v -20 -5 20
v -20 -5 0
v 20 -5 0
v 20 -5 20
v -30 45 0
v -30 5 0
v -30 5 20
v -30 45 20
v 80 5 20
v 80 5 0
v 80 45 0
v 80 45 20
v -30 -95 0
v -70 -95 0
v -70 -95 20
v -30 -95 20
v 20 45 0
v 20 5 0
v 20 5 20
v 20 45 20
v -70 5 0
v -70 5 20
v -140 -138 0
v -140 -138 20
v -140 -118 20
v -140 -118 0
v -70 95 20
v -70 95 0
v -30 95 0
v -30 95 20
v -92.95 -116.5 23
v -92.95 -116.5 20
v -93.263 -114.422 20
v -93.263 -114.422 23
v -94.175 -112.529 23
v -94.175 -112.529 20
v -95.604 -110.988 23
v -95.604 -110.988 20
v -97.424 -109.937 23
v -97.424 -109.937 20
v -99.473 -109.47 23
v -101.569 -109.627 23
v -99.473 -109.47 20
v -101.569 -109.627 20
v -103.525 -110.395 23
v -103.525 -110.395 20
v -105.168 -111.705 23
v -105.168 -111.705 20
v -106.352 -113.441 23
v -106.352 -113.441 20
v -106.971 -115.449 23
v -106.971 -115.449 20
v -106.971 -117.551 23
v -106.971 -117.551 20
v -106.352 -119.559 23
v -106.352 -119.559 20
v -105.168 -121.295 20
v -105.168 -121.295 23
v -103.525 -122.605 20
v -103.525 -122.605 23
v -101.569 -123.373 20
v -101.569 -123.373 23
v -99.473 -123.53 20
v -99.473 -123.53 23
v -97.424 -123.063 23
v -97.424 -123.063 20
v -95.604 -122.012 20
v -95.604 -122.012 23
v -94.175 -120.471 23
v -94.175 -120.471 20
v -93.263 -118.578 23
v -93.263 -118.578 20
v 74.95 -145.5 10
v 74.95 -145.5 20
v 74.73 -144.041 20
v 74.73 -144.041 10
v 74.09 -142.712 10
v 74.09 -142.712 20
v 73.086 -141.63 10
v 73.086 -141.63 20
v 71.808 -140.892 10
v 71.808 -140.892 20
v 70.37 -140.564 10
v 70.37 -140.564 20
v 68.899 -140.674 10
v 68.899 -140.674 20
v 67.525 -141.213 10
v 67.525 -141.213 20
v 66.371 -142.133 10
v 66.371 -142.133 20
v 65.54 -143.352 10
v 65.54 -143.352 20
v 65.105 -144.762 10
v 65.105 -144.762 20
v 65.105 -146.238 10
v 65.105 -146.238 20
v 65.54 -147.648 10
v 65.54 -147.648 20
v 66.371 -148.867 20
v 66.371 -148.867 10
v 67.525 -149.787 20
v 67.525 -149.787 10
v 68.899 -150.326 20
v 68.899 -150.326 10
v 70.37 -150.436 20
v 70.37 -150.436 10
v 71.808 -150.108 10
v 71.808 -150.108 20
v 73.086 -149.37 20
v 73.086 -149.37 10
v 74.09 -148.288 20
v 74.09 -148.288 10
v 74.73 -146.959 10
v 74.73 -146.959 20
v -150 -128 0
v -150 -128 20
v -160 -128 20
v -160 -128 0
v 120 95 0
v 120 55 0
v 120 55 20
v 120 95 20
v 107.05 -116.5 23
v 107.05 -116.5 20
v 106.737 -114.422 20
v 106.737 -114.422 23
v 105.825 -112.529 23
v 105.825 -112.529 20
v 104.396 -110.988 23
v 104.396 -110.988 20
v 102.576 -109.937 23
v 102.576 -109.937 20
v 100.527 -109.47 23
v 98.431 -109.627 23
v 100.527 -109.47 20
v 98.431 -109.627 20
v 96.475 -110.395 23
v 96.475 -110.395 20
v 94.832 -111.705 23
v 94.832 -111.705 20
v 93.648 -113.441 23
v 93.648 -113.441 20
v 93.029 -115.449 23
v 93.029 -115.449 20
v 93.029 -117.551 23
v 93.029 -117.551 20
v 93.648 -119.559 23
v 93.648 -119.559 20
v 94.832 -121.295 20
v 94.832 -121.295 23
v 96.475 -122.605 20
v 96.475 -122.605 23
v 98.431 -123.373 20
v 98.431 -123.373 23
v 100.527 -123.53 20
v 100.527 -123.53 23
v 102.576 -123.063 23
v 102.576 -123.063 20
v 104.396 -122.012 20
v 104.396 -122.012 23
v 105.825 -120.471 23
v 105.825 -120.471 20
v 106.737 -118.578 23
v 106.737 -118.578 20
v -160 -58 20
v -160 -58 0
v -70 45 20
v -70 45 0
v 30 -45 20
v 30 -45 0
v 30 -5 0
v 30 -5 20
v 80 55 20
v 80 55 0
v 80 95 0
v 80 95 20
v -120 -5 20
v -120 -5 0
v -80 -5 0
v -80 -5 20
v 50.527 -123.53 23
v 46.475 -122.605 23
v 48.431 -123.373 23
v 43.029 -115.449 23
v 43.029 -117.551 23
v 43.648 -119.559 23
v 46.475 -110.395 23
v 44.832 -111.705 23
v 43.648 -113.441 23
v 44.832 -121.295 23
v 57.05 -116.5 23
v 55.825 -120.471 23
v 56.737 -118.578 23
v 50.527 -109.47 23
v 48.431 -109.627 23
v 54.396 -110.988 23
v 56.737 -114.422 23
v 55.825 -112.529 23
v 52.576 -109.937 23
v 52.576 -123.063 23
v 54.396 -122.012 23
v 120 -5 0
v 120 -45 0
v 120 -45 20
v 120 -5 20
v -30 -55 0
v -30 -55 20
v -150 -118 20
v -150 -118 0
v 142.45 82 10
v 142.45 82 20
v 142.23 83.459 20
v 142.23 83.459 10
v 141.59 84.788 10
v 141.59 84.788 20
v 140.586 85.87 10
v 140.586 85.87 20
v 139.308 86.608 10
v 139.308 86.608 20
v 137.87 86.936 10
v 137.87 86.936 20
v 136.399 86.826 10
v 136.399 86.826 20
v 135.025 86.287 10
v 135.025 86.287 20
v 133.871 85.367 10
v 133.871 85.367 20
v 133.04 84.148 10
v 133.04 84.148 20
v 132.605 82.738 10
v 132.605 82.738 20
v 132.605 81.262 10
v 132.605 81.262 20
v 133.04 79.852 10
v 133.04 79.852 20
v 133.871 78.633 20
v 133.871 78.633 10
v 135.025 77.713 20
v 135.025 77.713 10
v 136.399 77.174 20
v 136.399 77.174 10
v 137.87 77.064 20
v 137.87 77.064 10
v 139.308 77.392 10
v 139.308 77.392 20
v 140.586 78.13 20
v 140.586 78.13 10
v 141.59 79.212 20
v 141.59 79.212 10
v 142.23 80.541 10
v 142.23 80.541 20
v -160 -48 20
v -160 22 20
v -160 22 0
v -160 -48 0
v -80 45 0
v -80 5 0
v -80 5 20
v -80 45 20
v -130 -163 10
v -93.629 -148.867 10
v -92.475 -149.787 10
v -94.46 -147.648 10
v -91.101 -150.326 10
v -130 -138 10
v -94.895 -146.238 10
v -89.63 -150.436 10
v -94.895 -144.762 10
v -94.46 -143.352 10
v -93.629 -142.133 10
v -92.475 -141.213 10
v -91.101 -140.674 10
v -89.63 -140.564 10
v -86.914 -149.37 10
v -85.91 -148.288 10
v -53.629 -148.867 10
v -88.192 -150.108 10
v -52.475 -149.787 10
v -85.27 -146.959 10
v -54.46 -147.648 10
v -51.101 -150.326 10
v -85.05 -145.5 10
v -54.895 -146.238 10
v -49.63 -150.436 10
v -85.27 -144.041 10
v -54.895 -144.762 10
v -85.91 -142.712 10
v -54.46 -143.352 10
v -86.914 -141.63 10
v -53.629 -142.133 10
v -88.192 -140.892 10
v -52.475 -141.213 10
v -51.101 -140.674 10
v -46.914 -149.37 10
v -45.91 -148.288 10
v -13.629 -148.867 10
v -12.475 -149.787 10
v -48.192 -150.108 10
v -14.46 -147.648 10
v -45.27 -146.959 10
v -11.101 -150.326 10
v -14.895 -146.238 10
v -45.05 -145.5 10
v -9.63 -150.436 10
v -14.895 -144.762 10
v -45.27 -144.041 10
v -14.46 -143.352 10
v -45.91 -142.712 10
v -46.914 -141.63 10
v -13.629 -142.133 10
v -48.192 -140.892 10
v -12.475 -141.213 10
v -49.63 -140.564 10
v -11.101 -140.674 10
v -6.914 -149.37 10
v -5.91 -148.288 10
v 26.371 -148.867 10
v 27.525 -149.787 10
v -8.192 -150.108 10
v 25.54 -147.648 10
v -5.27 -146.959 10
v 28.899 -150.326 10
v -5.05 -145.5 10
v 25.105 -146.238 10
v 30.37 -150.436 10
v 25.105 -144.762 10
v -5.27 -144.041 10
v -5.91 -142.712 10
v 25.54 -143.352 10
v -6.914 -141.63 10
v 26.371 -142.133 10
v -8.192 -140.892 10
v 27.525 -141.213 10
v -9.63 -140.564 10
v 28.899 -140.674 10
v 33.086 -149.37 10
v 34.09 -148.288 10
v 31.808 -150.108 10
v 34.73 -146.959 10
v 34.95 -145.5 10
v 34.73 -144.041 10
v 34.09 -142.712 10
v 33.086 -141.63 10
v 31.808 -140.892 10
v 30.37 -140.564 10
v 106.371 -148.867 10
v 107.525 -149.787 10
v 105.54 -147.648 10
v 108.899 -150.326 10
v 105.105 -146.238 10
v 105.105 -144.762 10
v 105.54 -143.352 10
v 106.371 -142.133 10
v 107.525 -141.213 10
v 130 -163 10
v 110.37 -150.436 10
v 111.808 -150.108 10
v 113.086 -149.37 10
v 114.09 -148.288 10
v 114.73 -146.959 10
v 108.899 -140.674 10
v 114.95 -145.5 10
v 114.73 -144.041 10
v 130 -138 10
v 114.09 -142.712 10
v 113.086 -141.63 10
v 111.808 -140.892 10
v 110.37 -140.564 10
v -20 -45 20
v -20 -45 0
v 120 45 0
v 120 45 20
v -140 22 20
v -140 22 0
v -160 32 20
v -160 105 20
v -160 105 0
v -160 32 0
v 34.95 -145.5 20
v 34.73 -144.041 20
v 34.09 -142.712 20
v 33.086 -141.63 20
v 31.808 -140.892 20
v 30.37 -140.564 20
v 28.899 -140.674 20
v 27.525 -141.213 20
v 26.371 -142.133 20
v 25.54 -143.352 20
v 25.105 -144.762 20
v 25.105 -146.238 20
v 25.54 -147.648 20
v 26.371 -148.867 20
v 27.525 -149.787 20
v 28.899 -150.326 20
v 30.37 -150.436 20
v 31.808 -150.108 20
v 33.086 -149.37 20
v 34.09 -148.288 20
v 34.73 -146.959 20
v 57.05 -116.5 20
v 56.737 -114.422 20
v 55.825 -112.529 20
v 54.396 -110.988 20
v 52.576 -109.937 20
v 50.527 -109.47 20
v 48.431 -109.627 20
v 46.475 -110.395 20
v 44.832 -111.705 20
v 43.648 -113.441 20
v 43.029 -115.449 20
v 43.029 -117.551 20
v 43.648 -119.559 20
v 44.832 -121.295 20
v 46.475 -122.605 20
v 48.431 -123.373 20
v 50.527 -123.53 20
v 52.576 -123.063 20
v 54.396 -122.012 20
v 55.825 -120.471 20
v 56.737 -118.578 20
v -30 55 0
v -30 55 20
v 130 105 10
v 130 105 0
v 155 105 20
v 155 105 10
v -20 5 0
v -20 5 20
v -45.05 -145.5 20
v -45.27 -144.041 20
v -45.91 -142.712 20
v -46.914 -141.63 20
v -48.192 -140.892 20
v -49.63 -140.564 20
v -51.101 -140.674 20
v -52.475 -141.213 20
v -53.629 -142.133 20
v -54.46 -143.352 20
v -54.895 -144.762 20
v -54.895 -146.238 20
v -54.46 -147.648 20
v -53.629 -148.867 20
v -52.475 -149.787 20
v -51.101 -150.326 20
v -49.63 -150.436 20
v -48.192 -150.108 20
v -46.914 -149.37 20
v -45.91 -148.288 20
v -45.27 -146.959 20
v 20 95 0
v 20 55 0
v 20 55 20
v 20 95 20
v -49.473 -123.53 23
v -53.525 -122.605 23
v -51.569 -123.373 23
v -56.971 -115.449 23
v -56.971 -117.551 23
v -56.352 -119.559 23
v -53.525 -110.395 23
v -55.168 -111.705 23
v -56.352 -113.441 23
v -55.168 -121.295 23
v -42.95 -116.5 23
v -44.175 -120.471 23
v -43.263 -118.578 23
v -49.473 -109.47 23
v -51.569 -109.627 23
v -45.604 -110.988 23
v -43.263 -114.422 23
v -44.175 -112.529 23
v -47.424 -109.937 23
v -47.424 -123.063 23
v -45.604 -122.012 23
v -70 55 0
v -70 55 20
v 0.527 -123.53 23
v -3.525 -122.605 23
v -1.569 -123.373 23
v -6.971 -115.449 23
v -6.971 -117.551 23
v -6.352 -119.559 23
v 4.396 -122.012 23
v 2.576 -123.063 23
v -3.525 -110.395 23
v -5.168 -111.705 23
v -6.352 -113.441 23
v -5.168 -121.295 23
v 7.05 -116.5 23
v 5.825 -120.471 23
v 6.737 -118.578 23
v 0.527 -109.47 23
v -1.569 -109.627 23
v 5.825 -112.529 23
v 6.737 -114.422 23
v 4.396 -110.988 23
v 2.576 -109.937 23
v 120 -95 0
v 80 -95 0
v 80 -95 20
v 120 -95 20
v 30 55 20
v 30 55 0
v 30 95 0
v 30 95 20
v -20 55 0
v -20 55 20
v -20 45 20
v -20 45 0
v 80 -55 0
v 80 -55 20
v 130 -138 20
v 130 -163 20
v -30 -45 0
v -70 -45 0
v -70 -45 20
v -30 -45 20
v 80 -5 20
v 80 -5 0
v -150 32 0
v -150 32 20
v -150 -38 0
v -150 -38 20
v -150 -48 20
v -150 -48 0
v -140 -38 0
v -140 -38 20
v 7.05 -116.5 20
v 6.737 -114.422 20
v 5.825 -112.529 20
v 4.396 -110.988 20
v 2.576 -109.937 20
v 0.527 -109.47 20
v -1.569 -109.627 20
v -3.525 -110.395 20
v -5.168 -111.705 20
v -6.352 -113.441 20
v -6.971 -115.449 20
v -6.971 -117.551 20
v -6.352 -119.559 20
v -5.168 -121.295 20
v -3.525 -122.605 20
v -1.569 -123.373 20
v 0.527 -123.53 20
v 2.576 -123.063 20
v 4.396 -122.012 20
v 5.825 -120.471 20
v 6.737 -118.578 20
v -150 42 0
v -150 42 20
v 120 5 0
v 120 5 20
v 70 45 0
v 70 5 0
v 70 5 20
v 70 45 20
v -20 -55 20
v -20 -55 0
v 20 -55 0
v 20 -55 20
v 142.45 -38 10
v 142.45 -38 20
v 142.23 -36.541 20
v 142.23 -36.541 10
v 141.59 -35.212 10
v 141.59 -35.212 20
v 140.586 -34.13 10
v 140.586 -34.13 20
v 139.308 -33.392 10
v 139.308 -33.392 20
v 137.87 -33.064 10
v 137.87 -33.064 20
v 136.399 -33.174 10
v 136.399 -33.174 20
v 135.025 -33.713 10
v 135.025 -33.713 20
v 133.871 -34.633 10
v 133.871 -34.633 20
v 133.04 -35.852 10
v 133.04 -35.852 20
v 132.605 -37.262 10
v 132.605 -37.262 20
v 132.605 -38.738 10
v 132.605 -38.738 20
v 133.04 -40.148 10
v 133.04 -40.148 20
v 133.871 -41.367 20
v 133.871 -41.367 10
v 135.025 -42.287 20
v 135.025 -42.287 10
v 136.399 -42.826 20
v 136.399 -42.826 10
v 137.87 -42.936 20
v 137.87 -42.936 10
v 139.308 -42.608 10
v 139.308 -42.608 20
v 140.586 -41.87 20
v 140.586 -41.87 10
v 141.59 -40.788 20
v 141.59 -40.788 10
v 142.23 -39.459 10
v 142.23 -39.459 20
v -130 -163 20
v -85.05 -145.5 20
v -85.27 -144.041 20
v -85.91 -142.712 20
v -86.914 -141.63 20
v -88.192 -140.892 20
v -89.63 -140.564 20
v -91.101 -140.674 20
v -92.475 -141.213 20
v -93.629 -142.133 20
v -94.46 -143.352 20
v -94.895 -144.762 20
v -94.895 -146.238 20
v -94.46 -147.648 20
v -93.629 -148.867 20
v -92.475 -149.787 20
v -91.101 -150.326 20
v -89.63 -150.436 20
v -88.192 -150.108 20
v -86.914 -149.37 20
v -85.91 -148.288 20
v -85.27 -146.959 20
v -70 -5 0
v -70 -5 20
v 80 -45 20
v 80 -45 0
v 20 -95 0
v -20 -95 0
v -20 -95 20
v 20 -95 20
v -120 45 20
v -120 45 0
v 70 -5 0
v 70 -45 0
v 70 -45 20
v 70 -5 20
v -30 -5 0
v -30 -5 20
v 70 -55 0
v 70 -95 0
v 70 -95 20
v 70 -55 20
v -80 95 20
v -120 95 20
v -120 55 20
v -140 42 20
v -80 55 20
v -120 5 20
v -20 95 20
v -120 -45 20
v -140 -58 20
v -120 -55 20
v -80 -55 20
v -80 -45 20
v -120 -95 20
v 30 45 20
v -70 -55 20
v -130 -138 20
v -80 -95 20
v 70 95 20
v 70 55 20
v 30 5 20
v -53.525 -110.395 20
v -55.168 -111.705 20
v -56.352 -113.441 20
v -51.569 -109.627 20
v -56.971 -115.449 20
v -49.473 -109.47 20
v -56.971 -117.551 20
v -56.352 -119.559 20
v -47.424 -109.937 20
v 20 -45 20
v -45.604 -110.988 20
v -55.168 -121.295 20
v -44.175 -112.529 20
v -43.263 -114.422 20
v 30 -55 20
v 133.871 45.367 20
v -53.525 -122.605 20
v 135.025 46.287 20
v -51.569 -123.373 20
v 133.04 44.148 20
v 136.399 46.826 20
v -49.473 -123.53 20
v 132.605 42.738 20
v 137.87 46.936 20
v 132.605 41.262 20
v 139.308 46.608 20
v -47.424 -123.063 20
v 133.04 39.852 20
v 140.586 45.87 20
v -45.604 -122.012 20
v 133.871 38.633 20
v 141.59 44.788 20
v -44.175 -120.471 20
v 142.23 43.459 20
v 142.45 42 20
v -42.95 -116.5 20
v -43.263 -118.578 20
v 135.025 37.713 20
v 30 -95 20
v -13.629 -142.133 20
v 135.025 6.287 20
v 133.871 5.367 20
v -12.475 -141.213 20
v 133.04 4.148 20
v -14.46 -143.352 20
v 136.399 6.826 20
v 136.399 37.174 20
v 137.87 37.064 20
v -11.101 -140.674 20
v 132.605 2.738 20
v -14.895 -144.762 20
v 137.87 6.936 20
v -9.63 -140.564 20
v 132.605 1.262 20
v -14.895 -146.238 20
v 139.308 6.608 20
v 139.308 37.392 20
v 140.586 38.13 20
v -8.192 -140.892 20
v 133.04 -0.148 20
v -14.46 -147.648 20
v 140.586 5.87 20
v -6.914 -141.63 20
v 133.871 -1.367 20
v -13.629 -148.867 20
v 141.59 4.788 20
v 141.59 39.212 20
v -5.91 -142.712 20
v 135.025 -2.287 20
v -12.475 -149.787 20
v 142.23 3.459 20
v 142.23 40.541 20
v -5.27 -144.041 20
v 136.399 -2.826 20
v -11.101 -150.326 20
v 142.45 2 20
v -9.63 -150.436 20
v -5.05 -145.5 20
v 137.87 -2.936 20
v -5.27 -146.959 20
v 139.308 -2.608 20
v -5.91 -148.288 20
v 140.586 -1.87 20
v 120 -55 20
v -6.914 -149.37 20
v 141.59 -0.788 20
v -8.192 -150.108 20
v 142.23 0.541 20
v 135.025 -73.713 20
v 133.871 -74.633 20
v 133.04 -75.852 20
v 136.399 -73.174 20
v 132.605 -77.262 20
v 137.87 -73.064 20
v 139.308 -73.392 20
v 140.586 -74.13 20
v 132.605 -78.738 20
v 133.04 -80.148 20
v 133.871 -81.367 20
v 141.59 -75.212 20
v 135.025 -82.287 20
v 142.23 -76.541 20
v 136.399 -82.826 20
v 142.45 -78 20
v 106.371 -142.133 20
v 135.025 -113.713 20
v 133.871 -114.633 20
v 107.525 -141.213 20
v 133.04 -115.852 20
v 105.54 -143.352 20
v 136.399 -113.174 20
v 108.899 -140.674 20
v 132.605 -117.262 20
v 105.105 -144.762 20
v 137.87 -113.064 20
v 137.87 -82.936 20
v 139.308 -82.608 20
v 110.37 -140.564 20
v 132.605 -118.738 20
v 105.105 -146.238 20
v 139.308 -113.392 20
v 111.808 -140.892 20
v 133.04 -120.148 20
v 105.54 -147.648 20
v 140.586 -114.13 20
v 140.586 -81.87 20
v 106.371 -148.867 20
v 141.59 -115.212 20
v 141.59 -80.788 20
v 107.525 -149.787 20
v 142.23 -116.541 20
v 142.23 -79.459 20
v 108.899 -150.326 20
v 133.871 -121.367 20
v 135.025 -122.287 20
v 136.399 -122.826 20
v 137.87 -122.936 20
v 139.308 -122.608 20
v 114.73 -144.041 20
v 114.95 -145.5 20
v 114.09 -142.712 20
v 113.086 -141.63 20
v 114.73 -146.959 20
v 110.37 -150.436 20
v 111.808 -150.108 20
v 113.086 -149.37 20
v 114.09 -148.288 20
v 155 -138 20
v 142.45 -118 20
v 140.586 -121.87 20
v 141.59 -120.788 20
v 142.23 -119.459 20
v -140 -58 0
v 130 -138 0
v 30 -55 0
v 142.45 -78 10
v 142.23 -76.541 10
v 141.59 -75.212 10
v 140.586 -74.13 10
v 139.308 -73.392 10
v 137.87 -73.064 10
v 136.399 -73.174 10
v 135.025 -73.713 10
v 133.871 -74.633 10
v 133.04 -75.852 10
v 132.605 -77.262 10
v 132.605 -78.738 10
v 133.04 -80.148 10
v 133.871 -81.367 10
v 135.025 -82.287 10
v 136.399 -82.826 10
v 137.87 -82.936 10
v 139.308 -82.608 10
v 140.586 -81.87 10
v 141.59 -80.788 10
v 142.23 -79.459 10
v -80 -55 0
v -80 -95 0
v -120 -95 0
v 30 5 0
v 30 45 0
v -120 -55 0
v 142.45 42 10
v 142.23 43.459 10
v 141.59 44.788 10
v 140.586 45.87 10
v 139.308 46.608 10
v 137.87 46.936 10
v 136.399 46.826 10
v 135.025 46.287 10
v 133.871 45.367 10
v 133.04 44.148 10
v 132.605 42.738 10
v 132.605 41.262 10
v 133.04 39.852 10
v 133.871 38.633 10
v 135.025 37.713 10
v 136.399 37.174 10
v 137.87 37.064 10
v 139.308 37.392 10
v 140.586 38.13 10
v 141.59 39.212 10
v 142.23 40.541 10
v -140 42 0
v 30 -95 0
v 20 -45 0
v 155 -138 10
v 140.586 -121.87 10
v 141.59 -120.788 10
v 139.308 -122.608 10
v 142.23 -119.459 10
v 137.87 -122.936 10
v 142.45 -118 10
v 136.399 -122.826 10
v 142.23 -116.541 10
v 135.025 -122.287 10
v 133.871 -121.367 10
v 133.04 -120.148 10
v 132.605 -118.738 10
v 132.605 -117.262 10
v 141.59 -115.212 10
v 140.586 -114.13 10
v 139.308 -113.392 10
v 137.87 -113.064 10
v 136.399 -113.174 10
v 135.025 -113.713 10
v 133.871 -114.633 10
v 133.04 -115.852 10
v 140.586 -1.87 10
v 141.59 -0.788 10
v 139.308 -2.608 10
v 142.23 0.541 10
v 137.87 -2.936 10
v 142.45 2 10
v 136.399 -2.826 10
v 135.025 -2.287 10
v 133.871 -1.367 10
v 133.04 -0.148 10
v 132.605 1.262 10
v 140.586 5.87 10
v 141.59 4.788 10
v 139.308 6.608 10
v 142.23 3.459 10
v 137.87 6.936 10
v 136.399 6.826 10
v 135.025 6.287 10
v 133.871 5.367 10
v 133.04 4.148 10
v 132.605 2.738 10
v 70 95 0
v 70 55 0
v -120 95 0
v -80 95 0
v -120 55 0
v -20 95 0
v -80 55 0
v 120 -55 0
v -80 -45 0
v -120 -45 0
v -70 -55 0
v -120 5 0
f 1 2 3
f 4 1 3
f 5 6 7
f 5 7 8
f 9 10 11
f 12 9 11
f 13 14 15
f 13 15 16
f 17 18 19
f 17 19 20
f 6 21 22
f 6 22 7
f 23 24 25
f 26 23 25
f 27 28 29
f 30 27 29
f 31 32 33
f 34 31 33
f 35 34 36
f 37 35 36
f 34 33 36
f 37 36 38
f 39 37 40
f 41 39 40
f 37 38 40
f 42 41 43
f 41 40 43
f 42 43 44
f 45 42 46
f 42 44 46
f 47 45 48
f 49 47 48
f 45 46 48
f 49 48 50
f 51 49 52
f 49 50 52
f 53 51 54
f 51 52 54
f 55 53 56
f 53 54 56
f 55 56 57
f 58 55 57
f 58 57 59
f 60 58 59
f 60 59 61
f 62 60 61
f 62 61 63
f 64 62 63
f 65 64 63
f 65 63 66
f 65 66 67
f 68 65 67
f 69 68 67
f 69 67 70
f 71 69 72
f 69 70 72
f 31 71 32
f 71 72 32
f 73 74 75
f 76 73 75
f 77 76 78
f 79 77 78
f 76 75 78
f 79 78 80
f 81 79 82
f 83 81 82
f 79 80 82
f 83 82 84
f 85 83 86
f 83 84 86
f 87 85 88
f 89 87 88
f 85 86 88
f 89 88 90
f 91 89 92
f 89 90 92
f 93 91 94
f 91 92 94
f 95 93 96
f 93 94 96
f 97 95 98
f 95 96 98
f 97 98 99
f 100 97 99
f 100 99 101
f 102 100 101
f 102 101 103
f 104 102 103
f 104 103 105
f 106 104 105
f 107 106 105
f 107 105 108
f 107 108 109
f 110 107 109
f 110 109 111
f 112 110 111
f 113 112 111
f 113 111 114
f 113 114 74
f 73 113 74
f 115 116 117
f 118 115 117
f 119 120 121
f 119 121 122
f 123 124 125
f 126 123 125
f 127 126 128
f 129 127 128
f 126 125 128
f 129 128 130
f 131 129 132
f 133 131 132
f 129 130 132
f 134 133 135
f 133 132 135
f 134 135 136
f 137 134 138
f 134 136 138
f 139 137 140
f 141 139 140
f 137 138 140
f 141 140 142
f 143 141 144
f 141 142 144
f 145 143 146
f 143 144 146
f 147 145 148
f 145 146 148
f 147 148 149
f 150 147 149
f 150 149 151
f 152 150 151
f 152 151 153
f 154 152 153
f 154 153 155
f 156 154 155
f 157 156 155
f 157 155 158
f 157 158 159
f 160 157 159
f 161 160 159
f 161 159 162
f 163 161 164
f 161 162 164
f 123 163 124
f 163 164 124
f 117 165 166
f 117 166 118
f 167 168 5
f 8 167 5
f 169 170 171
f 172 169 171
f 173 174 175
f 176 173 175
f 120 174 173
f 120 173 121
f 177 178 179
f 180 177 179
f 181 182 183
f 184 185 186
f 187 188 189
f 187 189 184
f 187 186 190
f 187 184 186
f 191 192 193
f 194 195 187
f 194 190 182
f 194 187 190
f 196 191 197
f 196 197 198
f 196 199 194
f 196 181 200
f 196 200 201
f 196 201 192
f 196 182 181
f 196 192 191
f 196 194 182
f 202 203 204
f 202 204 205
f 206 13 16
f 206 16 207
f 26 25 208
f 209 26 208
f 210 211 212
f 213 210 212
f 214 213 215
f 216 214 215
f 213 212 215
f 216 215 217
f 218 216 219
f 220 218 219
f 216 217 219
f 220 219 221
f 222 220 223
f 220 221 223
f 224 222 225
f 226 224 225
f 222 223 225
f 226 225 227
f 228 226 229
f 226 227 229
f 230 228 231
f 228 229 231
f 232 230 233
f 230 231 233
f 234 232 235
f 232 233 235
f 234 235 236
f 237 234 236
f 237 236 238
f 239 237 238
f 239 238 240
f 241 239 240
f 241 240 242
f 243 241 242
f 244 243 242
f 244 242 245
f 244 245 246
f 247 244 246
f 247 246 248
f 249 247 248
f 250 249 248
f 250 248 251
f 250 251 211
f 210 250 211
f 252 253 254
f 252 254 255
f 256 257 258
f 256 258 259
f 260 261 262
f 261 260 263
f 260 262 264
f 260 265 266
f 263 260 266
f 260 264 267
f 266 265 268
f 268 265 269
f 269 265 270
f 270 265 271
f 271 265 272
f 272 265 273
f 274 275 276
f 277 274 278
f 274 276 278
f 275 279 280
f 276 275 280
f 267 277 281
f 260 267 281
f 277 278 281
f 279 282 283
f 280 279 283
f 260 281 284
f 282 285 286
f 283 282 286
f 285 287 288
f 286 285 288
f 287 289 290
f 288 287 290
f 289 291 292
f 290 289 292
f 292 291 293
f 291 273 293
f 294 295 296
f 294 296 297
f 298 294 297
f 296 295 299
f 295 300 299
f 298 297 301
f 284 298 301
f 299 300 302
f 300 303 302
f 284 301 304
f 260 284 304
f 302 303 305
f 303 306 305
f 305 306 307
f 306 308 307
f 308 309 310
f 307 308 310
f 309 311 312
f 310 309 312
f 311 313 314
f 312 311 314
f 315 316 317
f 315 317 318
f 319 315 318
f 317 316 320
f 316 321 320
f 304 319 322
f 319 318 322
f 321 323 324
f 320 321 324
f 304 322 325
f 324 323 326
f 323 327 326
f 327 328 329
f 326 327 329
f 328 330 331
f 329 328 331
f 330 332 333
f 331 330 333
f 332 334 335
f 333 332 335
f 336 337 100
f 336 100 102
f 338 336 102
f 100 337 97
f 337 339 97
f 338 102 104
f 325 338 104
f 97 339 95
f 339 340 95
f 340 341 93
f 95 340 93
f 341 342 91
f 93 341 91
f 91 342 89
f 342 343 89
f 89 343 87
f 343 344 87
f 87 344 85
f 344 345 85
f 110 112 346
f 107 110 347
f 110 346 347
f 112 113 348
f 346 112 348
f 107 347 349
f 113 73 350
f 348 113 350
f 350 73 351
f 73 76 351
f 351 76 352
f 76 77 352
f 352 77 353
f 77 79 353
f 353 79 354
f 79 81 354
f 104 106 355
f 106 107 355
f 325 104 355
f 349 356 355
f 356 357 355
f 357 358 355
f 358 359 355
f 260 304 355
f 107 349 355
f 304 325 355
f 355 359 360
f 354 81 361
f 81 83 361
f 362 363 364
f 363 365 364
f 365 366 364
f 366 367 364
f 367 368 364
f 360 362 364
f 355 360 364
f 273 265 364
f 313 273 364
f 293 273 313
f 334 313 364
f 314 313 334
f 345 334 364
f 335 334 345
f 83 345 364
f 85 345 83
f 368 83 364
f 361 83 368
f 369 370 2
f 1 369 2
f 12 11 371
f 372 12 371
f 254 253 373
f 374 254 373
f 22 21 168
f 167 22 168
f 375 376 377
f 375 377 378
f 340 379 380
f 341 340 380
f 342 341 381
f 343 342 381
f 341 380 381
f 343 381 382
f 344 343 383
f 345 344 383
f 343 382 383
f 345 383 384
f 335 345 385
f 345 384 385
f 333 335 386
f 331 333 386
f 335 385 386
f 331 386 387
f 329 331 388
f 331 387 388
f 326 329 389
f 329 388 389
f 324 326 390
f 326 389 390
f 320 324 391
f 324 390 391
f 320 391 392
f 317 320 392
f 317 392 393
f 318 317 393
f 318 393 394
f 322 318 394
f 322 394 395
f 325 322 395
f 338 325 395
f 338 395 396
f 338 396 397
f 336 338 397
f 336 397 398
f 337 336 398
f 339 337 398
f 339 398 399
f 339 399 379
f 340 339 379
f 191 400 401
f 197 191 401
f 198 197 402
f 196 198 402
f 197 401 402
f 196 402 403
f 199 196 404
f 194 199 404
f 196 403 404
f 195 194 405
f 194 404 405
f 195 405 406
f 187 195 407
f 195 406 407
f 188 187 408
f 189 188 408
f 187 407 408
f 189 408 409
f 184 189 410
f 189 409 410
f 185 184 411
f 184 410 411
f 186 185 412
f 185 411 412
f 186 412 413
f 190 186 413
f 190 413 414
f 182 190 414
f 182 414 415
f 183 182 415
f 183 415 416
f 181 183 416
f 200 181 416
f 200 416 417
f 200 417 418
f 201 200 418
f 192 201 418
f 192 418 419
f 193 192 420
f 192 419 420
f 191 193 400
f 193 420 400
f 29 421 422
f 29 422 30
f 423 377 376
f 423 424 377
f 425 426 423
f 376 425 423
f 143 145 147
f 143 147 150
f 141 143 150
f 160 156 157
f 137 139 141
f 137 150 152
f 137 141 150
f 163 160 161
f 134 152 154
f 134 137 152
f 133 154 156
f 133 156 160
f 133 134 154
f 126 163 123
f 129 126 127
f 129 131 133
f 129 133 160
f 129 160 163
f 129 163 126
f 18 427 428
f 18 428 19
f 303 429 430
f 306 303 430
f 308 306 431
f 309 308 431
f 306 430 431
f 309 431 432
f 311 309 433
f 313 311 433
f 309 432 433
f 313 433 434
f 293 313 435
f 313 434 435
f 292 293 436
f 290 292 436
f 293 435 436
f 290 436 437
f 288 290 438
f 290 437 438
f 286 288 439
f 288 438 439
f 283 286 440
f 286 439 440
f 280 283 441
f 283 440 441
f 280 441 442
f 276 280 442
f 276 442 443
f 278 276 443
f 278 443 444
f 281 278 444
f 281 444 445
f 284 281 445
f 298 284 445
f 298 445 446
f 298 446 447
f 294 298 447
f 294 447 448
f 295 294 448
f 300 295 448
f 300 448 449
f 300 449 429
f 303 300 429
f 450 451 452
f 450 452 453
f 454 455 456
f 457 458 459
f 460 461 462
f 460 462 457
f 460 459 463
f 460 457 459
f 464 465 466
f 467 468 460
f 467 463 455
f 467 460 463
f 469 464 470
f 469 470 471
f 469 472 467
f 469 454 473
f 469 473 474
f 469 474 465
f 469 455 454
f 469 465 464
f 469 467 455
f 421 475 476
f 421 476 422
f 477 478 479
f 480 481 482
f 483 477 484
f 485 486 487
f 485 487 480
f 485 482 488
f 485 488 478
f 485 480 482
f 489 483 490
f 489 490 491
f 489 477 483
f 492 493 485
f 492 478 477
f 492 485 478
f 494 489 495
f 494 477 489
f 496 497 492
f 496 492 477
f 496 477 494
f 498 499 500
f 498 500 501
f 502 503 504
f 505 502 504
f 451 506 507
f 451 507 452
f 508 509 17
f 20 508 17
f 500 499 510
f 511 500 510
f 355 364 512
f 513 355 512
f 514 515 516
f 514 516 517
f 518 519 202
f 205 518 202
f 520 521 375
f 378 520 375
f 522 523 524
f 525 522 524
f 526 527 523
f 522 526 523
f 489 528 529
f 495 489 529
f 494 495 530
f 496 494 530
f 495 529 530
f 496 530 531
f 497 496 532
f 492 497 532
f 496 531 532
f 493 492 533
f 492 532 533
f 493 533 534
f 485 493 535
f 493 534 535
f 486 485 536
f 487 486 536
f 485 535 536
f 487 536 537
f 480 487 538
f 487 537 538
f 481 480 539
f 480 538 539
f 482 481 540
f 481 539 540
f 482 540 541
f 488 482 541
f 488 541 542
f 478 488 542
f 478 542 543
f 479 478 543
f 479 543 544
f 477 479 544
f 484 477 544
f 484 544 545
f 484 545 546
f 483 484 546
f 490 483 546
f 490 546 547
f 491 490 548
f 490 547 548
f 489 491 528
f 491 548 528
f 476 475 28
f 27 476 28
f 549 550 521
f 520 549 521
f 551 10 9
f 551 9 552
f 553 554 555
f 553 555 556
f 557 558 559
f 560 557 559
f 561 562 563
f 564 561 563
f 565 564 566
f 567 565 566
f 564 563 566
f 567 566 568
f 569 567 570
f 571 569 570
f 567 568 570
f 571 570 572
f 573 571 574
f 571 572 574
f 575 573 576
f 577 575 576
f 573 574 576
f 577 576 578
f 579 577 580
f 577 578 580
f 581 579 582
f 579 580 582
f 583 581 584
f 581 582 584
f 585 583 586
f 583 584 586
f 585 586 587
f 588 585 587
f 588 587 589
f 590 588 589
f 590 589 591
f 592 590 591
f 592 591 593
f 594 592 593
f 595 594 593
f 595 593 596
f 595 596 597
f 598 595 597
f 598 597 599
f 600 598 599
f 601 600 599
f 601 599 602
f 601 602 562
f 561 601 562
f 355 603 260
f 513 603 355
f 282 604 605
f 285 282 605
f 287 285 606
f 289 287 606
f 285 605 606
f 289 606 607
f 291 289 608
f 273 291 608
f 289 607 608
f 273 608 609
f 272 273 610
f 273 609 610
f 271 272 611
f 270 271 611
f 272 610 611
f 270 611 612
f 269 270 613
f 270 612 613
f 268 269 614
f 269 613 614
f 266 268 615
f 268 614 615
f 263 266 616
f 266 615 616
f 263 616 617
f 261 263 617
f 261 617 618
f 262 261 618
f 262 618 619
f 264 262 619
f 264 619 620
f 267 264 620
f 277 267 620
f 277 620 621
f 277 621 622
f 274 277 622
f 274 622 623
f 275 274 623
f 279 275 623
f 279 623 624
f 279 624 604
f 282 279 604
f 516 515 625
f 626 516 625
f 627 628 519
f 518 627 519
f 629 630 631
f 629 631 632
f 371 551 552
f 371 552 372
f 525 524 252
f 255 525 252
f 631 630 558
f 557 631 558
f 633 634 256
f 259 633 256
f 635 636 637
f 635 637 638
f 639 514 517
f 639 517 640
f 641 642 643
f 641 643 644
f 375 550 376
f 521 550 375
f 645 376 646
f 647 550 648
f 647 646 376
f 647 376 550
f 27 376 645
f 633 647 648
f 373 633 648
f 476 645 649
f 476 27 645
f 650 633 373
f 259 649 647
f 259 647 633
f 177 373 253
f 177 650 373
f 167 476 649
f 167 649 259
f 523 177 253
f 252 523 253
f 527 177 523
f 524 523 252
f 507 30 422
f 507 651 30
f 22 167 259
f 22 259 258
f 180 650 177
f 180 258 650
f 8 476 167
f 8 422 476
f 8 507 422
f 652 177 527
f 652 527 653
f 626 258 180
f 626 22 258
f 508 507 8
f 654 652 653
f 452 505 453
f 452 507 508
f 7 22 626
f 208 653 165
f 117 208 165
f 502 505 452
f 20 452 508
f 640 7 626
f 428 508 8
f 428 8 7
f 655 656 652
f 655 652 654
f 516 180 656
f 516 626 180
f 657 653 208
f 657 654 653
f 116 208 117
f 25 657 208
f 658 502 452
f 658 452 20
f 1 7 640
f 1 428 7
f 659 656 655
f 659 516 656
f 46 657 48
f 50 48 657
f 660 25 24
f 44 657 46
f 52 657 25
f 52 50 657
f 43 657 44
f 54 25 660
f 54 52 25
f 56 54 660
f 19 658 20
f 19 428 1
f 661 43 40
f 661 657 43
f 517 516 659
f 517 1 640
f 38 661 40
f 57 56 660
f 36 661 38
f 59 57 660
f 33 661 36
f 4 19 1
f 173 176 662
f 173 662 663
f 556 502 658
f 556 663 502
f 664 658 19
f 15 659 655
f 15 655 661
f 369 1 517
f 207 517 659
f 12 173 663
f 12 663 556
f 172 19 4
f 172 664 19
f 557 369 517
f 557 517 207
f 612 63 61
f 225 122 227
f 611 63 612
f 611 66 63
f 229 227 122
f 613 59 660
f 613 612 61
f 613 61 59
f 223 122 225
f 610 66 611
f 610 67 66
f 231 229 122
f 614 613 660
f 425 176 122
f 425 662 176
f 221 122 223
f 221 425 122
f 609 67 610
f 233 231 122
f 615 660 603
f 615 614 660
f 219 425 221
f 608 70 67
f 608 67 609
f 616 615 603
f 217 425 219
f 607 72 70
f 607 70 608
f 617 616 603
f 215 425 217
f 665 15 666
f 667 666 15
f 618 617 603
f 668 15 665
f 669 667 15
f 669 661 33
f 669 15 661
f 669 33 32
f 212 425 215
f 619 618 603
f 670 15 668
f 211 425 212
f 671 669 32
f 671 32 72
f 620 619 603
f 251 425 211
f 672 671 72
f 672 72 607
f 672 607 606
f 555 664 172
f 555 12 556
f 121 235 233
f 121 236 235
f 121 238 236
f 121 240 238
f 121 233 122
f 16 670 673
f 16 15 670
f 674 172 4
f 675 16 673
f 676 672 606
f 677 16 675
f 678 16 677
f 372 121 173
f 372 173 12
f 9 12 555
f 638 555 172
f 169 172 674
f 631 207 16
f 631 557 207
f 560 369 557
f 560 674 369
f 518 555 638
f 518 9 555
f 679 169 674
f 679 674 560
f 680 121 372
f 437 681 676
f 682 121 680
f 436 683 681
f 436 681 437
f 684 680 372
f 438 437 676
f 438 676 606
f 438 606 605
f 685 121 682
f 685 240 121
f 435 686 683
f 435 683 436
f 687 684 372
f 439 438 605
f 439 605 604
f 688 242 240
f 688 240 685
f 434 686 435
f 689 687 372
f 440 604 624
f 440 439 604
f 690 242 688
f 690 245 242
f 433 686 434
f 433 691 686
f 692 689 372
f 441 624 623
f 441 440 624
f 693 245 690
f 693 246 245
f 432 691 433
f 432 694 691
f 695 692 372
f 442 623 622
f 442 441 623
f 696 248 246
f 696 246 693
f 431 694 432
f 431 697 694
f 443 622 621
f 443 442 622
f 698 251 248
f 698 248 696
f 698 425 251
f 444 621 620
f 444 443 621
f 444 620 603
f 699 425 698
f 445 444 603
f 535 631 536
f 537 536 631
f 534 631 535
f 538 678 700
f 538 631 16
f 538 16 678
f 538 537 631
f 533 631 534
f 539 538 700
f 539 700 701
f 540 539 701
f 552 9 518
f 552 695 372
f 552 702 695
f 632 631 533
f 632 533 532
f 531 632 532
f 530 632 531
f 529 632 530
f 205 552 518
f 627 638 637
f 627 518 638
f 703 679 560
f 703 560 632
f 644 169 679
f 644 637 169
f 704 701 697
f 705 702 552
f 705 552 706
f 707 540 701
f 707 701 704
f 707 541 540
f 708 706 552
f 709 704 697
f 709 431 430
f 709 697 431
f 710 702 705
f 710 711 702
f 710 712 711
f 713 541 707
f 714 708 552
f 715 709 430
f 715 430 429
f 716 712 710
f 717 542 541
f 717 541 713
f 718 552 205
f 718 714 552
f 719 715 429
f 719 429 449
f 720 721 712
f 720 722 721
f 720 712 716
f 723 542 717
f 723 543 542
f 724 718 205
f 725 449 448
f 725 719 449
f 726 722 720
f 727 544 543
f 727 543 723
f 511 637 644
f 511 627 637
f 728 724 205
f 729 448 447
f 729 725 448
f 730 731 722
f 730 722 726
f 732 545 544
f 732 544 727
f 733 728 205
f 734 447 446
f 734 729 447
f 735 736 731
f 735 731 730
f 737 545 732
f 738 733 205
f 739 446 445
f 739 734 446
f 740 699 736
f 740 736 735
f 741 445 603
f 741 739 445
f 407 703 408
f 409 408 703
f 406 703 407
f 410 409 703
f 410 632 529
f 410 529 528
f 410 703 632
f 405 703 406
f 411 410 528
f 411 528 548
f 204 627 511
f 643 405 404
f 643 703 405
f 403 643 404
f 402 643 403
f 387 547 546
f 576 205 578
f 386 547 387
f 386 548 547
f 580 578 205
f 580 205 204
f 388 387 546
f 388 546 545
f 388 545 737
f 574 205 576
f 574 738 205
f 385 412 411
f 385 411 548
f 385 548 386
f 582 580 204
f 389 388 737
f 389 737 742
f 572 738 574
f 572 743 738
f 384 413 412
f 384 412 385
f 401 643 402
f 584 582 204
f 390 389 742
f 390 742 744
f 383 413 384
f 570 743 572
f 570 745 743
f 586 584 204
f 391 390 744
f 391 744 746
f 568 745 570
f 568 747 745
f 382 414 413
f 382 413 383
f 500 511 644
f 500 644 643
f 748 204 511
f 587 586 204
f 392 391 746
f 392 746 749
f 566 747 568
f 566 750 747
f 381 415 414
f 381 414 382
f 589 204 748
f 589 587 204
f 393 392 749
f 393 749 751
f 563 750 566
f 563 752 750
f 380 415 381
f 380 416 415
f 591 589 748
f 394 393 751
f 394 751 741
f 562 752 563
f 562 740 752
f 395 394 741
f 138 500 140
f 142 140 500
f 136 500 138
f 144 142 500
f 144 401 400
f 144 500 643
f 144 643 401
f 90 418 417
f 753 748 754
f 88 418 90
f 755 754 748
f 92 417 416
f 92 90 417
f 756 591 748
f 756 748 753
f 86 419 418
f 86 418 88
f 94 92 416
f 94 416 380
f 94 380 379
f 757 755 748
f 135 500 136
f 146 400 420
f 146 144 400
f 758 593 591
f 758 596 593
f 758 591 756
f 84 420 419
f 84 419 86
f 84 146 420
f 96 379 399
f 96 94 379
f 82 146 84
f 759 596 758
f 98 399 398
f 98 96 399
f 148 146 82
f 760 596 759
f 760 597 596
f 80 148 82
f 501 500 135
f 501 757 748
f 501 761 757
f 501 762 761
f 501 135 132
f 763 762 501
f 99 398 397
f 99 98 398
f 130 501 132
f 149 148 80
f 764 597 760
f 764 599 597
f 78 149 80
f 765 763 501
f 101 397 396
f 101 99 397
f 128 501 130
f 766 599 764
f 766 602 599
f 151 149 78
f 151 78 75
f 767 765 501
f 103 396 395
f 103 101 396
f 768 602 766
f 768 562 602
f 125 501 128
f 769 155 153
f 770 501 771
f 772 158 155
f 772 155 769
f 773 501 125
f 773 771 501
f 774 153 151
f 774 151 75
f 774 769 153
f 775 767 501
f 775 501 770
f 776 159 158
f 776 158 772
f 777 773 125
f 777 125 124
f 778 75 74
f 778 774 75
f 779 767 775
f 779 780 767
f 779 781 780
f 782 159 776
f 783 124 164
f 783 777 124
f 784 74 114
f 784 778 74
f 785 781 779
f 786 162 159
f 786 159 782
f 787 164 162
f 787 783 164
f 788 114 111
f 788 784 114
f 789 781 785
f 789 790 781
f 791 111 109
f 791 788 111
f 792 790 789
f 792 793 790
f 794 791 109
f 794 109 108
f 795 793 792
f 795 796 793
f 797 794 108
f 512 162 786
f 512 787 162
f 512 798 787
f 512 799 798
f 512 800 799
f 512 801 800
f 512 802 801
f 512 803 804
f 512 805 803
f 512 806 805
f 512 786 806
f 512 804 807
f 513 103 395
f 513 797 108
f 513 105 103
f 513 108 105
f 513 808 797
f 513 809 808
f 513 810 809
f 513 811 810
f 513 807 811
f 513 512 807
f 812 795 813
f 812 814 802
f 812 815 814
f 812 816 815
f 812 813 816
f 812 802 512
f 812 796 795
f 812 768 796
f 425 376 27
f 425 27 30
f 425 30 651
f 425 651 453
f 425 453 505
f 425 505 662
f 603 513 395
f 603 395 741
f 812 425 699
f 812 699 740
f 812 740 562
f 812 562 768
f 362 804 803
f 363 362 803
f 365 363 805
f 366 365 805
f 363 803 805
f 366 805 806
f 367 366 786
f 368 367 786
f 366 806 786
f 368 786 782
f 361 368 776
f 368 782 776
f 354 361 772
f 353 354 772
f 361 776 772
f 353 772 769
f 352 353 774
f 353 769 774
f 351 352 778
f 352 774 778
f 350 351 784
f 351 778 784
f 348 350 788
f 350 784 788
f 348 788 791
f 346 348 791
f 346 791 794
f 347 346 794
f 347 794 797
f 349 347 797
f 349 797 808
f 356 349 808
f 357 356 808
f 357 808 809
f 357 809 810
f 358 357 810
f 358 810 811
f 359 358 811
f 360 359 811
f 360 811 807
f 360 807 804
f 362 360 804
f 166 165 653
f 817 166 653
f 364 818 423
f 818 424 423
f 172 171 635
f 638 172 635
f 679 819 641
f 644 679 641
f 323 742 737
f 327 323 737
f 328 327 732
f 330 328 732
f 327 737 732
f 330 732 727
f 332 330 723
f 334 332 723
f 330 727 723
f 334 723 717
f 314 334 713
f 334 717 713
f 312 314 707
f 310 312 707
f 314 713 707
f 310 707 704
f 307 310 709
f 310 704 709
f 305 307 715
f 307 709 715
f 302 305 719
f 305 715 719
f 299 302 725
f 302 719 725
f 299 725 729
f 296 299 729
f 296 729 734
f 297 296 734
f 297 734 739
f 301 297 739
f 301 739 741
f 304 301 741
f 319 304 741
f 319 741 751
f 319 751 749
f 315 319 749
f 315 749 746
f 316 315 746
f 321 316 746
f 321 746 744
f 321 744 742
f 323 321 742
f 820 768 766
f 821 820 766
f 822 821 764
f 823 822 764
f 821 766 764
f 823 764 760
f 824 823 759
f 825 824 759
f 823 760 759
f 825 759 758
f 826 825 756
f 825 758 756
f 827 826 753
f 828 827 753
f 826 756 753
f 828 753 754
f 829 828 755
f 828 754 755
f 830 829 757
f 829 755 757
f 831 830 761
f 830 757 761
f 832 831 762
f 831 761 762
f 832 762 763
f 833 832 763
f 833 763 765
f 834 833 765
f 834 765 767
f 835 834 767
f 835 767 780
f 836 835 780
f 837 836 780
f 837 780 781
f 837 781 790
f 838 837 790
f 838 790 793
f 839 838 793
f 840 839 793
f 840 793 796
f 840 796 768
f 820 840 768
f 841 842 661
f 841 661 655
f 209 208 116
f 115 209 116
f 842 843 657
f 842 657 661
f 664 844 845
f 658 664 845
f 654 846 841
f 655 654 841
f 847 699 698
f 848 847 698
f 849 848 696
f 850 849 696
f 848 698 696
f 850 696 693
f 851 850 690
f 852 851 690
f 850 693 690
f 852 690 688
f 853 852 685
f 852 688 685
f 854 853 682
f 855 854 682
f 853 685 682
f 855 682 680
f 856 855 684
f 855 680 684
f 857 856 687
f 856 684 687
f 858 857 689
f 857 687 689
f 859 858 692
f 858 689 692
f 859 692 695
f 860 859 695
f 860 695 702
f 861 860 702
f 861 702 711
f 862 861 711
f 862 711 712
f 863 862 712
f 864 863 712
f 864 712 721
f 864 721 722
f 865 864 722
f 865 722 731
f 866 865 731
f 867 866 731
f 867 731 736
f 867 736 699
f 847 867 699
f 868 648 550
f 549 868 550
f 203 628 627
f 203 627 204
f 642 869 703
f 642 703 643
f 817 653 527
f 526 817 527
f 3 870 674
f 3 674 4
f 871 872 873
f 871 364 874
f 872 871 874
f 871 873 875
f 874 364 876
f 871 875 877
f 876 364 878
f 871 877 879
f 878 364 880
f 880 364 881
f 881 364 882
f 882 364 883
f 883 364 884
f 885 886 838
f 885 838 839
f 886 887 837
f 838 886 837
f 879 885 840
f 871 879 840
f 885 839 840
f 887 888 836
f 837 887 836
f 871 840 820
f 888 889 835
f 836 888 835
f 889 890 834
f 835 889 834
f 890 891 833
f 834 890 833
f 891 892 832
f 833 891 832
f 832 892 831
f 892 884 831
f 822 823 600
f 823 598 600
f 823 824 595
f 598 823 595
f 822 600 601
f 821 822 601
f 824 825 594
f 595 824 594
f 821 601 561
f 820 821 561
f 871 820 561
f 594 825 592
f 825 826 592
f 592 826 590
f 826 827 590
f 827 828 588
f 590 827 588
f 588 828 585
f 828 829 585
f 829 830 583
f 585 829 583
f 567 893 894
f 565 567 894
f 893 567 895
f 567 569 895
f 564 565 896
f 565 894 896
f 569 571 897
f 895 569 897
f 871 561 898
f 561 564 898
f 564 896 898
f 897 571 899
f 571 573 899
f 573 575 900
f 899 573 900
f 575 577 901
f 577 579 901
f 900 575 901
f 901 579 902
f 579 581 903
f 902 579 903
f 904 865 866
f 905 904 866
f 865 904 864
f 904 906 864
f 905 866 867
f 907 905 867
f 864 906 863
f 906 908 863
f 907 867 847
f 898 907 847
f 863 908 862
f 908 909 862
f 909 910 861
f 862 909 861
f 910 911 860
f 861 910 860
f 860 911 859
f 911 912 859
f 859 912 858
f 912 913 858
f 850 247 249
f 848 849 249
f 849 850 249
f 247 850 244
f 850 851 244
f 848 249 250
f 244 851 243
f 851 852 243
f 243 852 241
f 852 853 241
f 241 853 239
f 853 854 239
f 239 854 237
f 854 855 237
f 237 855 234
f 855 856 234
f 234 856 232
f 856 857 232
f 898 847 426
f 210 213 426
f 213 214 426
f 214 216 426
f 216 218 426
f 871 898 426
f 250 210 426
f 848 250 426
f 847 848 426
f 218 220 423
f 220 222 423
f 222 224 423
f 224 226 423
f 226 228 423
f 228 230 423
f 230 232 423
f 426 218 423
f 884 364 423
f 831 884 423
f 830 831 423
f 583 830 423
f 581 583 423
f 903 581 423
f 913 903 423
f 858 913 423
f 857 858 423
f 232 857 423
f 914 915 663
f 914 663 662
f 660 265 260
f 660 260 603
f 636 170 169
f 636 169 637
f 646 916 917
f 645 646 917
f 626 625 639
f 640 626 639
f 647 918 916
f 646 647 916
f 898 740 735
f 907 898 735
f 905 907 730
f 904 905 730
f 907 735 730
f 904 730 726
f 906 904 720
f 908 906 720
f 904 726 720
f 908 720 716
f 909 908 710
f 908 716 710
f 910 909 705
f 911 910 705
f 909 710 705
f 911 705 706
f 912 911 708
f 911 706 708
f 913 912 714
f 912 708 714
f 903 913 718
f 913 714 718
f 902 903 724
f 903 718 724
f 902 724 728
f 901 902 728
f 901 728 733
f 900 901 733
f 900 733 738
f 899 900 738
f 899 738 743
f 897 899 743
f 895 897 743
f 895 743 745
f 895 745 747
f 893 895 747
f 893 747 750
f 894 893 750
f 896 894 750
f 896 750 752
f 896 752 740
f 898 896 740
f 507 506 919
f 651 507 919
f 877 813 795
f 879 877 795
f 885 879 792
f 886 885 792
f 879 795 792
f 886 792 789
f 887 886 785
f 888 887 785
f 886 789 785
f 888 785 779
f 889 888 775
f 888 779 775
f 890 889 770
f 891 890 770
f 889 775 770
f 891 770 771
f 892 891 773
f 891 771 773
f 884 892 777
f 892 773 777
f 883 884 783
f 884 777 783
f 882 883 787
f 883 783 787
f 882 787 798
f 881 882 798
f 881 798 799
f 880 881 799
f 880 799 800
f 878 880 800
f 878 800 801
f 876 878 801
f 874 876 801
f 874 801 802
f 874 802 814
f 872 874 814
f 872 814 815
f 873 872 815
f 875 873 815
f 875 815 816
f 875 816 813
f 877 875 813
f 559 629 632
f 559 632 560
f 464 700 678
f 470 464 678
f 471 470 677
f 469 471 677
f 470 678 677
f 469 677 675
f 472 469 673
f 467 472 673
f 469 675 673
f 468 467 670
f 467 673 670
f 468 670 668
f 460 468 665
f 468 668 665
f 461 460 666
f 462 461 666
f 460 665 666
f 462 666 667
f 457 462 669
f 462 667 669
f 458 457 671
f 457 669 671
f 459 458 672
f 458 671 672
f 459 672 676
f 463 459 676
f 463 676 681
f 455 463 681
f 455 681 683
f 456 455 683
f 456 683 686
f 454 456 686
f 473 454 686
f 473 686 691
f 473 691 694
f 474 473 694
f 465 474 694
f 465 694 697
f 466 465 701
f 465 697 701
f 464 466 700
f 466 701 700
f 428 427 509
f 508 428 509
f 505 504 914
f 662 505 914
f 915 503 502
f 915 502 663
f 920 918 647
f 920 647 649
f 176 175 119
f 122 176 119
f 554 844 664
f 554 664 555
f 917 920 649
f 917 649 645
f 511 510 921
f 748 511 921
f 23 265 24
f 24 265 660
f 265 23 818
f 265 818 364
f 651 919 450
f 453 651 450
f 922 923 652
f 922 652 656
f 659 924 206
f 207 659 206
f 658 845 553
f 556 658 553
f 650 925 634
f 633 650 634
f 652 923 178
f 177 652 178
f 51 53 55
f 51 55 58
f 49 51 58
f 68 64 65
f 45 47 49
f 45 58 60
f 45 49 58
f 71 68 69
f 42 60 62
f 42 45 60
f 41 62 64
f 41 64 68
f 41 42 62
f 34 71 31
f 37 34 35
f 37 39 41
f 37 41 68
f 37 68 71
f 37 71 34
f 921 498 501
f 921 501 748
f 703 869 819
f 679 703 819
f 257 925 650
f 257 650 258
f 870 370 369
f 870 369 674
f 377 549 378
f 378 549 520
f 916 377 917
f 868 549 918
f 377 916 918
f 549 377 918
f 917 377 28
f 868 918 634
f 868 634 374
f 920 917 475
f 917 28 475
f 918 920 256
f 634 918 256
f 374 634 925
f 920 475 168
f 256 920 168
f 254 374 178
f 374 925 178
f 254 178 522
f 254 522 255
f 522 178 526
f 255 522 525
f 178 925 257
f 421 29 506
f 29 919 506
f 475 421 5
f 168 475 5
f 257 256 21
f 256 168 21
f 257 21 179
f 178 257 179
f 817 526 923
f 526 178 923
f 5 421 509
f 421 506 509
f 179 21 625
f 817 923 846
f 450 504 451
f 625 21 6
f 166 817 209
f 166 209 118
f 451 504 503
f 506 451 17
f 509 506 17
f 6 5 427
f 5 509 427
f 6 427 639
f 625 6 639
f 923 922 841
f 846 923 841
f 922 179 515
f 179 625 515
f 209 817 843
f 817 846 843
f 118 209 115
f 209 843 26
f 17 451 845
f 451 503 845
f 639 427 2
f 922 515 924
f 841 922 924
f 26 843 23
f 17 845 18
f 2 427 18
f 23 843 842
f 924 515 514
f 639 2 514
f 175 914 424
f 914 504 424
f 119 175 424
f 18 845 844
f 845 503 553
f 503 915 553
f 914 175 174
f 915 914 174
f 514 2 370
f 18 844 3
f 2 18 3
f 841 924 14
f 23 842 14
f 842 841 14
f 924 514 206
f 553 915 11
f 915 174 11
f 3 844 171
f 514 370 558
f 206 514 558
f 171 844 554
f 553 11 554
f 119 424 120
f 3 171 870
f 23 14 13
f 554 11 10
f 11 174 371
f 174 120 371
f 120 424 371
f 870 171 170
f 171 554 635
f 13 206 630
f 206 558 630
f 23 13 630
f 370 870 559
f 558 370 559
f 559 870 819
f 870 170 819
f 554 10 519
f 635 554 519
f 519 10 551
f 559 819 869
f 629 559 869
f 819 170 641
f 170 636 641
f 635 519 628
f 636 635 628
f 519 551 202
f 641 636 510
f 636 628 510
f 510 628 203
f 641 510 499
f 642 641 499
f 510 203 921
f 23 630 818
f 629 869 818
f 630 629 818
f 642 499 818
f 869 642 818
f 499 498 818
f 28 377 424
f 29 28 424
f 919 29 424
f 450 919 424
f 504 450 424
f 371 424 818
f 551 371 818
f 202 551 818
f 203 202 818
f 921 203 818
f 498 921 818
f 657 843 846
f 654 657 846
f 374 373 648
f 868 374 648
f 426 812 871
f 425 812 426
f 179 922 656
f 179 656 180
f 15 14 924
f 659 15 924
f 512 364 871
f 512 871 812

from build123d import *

# Parameters (mm, degrees)
F0_W      = 260
F0_H      = 210
F0_W_2    = 40
F0_H_2    = 40
F1_DEPTH  = 20
F1_FACE_W = 260
F1_FACE_H = 20
F2_DEPTH  = 33
F3_W      = 260
F3_H      = 10
F4_DEPTH  = 25
F5_R      = 4.95
F6_DEPTH  = 25
F7_W      = 243
F7_H      = 10
F8_DEPTH  = 25
F9_R      = 4.95
F10_DEPTH = 25
F11_W     = 243
F11_H     = 20
F12_DEPTH = 30
F14_DEPTH = 25
F15_R     = 7.05
F16_DEPTH = 3


with BuildPart() as f1:
    # F0 (on Top) → F1 (new body)
    with BuildSketch(Plane.XY):
        Rectangle(F0_W, F0_H)
        with Locations((-100, -75)):
            Rectangle(F0_W_2, F0_H_2, mode=Mode.SUBTRACT)
        with Locations((-50, -75)):
            Rectangle(F0_W_2, F0_H_2, mode=Mode.SUBTRACT)
        with Locations((-100, -25)):
            Rectangle(F0_W_2, F0_H_2, mode=Mode.SUBTRACT)
        with Locations((-50, -25)):
            Rectangle(F0_W_2, F0_H_2, mode=Mode.SUBTRACT)
        with Locations((0, -75)):
            Rectangle(F0_W_2, F0_H_2, mode=Mode.SUBTRACT)
        with Locations((50, -75)):
            Rectangle(F0_W_2, F0_H_2, mode=Mode.SUBTRACT)
        with Locations((100, -75)):
            Rectangle(F0_W_2, F0_H_2, mode=Mode.SUBTRACT)
        with Locations((0, -25)):
            Rectangle(F0_W_2, F0_H_2, mode=Mode.SUBTRACT)
        with Locations((50, -25)):
            Rectangle(F0_W_2, F0_H_2, mode=Mode.SUBTRACT)
        with Locations((100, -25)):
            Rectangle(F0_W_2, F0_H_2, mode=Mode.SUBTRACT)
        with Locations((-100, 25)):
            Rectangle(F0_W_2, F0_H_2, mode=Mode.SUBTRACT)
        with Locations((-50, 25)):
            Rectangle(F0_W_2, F0_H_2, mode=Mode.SUBTRACT)
        with Locations((-100, 75)):
            Rectangle(F0_W_2, F0_H_2, mode=Mode.SUBTRACT)
        with Locations((-50, 75)):
            Rectangle(F0_W_2, F0_H_2, mode=Mode.SUBTRACT)
        with Locations((0, 25)):
            Rectangle(F0_W_2, F0_H_2, mode=Mode.SUBTRACT)
        with Locations((50, 25)):
            Rectangle(F0_W_2, F0_H_2, mode=Mode.SUBTRACT)
        with Locations((100, 25)):
            Rectangle(F0_W_2, F0_H_2, mode=Mode.SUBTRACT)
        with Locations((0, 75)):
            Rectangle(F0_W_2, F0_H_2, mode=Mode.SUBTRACT)
        with Locations((50, 75)):
            Rectangle(F0_W_2, F0_H_2, mode=Mode.SUBTRACT)
        with Locations((100, 75)):
            Rectangle(F0_W_2, F0_H_2, mode=Mode.SUBTRACT)
    extrude(amount=F1_DEPTH)

    # F1_face (on face) → F2 (join)
    with BuildSketch(Plane(origin=(0, -105, 10), x_dir=(1, 0, 0), z_dir=(0, -1, 0))):
        Rectangle(F1_FACE_W, F1_FACE_H)
    extrude(amount=F2_DEPTH)

    # F3 (on face) → F4 (join)
    with BuildSketch(Plane.XZ.offset(138)):
        with Locations((0, 15)):
            Rectangle(F3_W, F3_H)
    extrude(amount=F4_DEPTH)

    # F5 (on face) → F6 (cut)
    with BuildSketch(Plane.XY.offset(20)):
        with Locations((110, -145.5)):
            Circle(F5_R)
        with Locations((70, -145.5)):
            Circle(F5_R)
        with Locations((30, -145.5)):
            Circle(F5_R)
        with Locations((-10, -145.5)):
            Circle(F5_R)
        with Locations((-50, -145.5)):
            Circle(F5_R)
        with Locations((-90, -145.5)):
            Circle(F5_R)
    extrude(amount=-F6_DEPTH, mode=Mode.SUBTRACT)

    # F7 (on face) → F8 (join)
    with BuildSketch(Plane.YZ.offset(130)):
        with Locations((-16.5, 15)):
            Rectangle(F7_W, F7_H)
    extrude(amount=F8_DEPTH)

    # F9 (on face) → F10 (cut)
    with BuildSketch(Plane.XY.offset(20)):
        with Locations((137.5, -118)):
            Circle(F9_R)
        with Locations((137.5, -78)):
            Circle(F9_R)
        with Locations((137.5, -38)):
            Circle(F9_R)
        with Locations((137.5, 2)):
            Circle(F9_R)
        with Locations((137.5, 42)):
            Circle(F9_R)
        with Locations((137.5, 82)):
            Circle(F9_R)
    extrude(amount=-F10_DEPTH, mode=Mode.SUBTRACT)

    # F11 (on face) → F12 (join)
    with BuildSketch(Plane(origin=(-130, 0, 0), x_dir=(0, -1, 0), z_dir=(-1, 0, 0))):
        with Locations((16.5, 10)):
            Rectangle(F11_W, F11_H)
    extrude(amount=F12_DEPTH)

    # F13 (on face) → F14 (cut)
    with BuildSketch(Plane.XY.offset(20)):
        Polygon((-160, -128), (-160, -138), (-140, -138), (-140, -118), (-150, -118), (-150, -128), align=None)
        Polygon((-140, -58), (-140, -38), (-150, -38), (-150, -48), (-160, -48), (-160, -58), align=None)
        Polygon((-140, 22), (-140, 42), (-150, 42), (-150, 32), (-160, 32), (-160, 22), align=None)
    extrude(amount=-F14_DEPTH, mode=Mode.SUBTRACT)

    # F15 (on face) → F16 (join)
    with BuildSketch(Plane.XY.offset(20)):
        with Locations((100, -116.5)):
            Circle(F15_R)
        with Locations((50, -116.5)):
            Circle(F15_R)
        with Locations((0, -116.5)):
            Circle(F15_R)
        with Locations((-50, -116.5)):
            Circle(F15_R)
        with Locations((-100, -116.5)):
            Circle(F15_R)
    extrude(amount=F16_DEPTH)


solid = f1.part
